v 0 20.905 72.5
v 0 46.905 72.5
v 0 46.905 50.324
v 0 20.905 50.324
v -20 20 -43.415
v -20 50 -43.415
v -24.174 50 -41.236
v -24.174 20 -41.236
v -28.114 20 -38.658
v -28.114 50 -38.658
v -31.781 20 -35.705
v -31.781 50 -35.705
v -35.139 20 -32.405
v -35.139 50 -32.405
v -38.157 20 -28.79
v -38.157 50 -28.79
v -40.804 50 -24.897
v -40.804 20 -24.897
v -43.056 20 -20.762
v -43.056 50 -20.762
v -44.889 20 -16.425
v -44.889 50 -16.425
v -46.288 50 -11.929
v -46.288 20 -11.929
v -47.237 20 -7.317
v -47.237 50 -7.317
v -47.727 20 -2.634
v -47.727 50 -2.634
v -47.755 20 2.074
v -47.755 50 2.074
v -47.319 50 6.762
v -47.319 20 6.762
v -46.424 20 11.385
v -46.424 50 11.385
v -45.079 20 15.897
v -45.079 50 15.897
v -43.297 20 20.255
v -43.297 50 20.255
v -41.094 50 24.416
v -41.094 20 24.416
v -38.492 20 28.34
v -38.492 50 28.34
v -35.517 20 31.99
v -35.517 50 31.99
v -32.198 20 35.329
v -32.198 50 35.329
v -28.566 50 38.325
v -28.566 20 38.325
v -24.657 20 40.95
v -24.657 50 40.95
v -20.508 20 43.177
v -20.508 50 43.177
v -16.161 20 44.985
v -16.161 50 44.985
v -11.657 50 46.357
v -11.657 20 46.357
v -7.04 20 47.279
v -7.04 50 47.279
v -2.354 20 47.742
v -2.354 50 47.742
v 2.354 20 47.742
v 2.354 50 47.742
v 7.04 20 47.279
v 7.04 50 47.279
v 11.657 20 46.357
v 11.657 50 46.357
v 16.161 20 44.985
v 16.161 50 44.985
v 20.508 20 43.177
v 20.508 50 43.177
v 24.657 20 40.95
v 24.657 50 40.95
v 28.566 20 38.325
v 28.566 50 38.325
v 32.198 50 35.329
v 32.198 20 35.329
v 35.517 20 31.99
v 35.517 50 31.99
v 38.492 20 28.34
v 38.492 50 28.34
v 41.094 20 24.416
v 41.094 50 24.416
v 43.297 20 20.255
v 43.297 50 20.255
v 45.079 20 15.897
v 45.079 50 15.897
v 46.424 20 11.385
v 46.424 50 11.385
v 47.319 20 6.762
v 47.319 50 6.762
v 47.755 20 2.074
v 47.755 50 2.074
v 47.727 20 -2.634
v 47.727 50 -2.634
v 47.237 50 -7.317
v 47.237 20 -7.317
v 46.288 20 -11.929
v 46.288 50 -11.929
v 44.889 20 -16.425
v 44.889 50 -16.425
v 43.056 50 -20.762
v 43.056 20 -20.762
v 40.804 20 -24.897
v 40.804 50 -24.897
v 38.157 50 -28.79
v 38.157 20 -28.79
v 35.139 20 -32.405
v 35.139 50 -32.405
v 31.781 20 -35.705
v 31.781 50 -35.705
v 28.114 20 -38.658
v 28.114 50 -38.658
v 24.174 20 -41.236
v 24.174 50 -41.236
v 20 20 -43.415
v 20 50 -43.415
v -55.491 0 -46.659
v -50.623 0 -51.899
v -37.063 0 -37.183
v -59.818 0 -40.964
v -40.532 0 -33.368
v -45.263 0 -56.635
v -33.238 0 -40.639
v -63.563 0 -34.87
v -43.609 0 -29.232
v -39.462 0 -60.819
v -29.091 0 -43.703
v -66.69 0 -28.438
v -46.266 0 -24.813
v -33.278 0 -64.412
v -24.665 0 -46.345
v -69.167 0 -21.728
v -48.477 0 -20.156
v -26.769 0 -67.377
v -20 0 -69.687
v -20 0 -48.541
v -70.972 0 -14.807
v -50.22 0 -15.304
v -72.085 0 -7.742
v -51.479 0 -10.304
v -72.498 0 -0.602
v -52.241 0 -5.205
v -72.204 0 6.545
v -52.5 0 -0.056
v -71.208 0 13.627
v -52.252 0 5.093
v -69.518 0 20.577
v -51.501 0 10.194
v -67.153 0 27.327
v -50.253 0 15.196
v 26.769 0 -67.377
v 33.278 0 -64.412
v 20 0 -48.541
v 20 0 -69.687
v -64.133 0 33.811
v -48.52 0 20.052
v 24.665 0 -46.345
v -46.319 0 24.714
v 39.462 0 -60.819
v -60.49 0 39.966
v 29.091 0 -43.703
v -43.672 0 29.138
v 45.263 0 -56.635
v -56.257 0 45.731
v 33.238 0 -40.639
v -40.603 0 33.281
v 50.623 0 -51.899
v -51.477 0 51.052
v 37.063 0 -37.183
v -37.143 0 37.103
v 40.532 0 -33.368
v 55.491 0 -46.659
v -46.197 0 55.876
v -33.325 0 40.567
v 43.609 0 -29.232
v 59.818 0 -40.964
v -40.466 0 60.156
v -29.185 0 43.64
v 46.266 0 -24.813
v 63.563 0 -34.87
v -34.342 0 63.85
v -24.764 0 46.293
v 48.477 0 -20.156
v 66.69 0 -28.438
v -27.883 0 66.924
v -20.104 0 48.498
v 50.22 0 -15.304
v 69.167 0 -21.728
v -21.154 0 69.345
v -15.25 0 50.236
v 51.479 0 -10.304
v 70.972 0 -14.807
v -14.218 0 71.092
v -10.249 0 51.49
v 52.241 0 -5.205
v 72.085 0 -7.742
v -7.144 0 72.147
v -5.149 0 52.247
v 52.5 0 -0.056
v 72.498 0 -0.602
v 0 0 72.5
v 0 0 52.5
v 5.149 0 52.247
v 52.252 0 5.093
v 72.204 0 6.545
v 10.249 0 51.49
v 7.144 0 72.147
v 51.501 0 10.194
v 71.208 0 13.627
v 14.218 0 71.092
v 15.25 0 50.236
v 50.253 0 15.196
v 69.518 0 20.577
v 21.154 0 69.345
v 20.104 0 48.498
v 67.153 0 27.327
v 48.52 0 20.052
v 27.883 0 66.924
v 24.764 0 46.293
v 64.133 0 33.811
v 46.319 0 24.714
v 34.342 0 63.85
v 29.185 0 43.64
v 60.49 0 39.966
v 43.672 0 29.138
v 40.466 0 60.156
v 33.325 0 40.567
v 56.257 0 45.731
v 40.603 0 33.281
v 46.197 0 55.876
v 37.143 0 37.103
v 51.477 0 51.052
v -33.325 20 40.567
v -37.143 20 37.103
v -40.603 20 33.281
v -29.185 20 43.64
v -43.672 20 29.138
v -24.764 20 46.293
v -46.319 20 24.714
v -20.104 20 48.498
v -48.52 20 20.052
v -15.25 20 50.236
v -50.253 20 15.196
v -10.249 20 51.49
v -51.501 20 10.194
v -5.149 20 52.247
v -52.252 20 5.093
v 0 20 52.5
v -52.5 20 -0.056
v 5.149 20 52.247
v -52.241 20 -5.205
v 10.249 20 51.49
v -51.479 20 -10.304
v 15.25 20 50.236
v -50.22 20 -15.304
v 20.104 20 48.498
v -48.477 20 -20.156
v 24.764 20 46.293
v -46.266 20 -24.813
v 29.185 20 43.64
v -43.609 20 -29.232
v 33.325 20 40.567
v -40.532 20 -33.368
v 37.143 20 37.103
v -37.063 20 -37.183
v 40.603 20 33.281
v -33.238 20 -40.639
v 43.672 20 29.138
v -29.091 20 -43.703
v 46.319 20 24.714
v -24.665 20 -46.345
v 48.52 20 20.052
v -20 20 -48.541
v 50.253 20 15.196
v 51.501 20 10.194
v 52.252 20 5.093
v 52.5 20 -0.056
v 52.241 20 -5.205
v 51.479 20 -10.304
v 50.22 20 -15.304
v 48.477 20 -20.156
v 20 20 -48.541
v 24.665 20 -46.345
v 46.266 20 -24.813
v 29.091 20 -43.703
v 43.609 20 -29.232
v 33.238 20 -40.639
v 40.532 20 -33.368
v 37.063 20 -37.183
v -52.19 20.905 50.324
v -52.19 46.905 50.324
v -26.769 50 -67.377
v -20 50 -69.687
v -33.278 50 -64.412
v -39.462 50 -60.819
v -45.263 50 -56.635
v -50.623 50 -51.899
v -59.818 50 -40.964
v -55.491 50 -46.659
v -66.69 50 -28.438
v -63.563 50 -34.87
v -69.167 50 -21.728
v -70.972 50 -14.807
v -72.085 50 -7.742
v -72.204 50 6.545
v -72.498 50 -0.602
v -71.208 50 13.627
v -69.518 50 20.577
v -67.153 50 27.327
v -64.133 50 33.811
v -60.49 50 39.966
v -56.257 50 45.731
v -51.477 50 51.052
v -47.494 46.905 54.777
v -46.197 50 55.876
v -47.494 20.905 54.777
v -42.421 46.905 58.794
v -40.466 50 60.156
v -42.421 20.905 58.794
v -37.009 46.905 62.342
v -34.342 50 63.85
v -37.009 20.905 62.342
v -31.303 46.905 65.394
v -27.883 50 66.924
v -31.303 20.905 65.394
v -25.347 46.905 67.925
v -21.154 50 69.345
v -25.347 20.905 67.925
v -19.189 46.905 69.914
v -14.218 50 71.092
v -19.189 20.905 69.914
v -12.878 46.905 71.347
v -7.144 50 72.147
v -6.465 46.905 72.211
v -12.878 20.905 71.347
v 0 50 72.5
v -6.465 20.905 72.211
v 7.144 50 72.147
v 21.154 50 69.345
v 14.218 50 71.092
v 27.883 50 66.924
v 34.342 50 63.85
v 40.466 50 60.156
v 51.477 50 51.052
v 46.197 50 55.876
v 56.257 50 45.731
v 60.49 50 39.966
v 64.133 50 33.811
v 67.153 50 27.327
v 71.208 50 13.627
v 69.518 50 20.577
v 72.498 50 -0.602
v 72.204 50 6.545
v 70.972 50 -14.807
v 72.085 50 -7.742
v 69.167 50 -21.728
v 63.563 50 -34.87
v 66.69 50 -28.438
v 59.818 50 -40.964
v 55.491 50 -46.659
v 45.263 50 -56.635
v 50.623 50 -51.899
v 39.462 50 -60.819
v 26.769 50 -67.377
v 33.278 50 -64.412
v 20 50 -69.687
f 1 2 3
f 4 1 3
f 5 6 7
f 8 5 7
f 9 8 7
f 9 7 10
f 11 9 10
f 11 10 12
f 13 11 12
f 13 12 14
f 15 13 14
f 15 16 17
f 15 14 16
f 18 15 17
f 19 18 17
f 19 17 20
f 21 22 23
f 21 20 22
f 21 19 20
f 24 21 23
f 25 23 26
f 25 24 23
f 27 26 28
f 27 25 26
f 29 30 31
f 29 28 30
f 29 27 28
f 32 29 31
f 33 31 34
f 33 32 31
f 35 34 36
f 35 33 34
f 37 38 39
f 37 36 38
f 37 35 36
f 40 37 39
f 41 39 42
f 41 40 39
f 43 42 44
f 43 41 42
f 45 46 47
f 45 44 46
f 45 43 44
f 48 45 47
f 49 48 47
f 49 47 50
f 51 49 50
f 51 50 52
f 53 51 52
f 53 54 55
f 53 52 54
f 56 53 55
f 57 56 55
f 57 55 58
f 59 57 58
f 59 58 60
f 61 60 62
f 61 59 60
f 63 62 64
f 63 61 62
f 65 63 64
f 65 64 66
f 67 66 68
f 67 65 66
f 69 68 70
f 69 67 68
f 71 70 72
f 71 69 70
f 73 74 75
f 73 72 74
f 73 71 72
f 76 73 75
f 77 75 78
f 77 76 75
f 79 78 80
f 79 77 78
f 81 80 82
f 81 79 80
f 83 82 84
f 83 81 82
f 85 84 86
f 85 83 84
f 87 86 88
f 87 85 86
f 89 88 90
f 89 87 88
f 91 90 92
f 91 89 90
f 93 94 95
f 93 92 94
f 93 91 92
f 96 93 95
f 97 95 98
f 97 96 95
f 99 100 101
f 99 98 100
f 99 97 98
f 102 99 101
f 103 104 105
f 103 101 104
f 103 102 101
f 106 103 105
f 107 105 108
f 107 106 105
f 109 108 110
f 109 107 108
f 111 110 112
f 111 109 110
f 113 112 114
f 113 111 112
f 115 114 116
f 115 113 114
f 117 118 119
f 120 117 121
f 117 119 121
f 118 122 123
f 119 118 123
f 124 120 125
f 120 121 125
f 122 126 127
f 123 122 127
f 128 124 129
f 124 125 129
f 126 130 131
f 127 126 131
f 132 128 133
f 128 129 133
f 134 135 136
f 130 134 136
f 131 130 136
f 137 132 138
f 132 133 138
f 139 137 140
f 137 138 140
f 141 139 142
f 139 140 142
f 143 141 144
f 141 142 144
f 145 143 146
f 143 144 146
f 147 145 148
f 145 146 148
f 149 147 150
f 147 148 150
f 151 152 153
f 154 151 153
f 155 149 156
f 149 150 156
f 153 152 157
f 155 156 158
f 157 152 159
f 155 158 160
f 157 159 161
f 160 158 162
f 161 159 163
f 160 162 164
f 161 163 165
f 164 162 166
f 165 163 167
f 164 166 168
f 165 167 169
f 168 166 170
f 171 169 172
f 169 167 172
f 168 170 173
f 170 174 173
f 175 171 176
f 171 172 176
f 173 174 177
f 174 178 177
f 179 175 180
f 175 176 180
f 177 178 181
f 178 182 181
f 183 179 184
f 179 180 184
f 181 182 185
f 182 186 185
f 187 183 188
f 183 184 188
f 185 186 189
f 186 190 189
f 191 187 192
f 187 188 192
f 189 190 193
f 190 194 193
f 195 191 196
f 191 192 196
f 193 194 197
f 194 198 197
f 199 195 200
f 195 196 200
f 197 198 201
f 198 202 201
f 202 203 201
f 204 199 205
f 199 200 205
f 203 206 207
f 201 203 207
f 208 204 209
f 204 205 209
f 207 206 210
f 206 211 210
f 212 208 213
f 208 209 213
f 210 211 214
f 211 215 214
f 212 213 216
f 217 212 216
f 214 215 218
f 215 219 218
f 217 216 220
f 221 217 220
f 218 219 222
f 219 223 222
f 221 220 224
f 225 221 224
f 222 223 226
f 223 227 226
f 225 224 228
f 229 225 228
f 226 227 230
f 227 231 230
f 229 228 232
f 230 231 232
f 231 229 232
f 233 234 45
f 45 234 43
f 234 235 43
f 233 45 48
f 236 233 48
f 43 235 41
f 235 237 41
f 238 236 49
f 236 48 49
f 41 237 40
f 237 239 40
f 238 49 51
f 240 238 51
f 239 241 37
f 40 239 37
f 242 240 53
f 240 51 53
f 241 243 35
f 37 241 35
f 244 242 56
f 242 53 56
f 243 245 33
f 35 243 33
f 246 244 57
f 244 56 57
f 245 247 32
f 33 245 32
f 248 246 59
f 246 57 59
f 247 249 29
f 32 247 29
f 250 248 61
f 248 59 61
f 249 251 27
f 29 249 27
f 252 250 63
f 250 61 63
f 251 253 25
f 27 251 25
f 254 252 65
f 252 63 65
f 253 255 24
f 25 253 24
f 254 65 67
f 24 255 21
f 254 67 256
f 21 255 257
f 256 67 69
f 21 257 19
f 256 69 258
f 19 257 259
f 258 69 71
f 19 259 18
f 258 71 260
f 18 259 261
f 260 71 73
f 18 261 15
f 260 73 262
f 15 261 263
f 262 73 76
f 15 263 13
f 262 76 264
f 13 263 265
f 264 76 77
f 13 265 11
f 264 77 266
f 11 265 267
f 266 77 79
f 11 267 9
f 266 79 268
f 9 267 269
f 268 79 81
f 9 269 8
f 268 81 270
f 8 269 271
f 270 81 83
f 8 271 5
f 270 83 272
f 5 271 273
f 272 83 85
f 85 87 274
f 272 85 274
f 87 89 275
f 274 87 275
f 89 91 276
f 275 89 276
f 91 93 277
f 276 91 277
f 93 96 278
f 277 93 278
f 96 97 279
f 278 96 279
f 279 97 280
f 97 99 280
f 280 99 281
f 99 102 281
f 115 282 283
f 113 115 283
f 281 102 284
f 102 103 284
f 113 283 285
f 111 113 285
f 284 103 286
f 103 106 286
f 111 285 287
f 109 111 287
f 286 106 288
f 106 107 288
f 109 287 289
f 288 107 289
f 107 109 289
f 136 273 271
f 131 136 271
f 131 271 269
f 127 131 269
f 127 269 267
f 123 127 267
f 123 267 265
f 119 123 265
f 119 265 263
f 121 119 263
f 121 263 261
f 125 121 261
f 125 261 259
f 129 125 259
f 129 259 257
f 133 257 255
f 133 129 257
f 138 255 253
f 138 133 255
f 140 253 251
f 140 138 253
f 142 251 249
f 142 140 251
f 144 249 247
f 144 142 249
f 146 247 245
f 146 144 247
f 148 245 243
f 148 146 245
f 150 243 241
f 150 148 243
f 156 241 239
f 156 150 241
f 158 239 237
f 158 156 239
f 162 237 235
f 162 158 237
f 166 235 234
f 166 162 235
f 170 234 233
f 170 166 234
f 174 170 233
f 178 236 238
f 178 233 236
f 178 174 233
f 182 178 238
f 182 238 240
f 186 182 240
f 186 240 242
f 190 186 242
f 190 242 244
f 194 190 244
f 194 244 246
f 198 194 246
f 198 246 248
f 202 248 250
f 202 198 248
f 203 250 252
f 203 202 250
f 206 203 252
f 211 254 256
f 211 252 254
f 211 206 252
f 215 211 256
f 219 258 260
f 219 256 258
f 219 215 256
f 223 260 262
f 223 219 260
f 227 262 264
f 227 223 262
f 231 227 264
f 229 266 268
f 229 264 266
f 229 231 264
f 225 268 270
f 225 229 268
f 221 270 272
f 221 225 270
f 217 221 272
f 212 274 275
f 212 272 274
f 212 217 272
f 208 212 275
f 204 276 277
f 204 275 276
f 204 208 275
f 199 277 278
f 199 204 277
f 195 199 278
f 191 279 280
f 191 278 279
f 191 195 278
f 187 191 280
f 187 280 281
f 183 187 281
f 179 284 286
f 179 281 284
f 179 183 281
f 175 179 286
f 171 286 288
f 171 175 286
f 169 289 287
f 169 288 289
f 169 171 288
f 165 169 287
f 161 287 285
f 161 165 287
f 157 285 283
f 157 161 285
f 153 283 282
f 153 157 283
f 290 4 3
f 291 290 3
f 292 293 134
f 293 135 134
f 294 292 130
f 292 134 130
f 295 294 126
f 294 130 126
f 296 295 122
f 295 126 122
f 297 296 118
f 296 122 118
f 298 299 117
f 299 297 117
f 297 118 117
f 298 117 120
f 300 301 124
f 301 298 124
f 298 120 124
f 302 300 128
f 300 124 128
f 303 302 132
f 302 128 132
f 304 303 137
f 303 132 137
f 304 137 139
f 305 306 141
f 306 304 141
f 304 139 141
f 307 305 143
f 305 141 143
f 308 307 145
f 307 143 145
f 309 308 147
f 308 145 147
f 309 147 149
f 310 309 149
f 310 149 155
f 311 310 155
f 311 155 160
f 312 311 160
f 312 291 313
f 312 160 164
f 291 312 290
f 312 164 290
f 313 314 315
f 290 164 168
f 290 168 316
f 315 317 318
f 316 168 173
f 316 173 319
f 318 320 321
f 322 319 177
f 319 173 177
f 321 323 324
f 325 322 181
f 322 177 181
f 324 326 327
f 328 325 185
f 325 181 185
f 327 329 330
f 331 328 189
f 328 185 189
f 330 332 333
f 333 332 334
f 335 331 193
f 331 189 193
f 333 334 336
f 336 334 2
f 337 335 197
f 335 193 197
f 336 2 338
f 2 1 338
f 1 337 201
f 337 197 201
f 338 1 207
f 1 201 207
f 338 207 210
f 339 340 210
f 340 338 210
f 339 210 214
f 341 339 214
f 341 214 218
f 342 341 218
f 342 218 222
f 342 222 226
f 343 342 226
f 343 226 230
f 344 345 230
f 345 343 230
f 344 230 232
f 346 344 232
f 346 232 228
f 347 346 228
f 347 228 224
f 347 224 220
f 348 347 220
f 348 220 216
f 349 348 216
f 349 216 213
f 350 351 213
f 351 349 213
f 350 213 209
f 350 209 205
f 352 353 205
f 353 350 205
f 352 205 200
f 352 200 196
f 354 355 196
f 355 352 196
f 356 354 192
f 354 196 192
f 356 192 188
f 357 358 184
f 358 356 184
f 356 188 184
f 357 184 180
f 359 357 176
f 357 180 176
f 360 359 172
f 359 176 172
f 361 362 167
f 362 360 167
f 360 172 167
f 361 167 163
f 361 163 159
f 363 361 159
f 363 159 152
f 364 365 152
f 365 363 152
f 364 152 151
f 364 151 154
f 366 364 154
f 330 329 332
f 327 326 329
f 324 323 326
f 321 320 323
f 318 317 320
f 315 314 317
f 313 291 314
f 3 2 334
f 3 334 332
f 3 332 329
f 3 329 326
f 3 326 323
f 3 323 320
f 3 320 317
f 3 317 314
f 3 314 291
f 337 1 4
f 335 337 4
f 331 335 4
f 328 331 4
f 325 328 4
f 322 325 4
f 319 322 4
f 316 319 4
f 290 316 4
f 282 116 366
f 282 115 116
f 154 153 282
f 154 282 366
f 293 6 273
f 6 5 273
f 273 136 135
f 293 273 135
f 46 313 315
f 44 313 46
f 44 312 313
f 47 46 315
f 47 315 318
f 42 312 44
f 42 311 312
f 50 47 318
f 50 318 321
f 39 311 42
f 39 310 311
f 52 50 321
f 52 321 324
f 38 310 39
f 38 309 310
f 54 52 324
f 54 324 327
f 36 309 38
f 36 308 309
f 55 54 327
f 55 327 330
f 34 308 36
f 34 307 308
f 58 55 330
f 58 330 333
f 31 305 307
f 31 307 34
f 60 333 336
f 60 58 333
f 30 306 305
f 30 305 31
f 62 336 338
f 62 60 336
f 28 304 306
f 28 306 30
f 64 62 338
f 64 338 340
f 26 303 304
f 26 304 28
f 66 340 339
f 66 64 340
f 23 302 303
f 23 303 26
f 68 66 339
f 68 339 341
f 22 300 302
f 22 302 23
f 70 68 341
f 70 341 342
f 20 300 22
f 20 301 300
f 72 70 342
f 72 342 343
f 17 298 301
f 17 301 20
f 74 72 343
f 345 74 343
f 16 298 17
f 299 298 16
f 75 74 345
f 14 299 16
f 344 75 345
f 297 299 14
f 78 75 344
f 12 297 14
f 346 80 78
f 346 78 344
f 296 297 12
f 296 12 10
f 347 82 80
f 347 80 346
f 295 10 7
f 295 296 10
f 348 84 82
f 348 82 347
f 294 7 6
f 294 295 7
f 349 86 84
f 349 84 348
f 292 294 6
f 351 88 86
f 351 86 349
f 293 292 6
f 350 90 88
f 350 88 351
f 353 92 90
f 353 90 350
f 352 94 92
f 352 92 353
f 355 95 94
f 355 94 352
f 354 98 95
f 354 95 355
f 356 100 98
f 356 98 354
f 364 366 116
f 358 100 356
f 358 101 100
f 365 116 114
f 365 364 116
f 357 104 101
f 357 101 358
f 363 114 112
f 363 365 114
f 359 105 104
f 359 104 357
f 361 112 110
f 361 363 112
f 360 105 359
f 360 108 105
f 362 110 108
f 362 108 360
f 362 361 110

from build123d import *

# Parameters (mm, degrees)
ESBO_O1_R                  = 72.5
ESBO_O1_R_2                = 52.5
RESSALTO_EXTRUS_O1_DEPTH   = 50
CORTE_EXTRUS_O1_DEPTH      = 115.072345465
CORTE_EXTRUS_O1_DEPTH_BACK = 115.072345465
ESBO_O2_W                  = 40
ESBO_O2_H                  = 97.356983932
RESSALTO_EXTRUS_O2_START   = -30
ESBO_O3_R                  = 52.5
ESBO_O3_R_2                = 47.8
RESSALTO_EXTRUS_O2_DEPTH   = 30
CORTE_EXTRUS_O2_DEPTH      = 115.072345465
CORTE_EXTRUS_O2_DEPTH_BACK = 115.072345465
ESBO_O5_W                  = 23.143765799
ESBO_O5_H                  = 26
CORTE_EXTRUS_O3_DEPTH      = 115.072345465


with BuildPart() as part:
    # Esboço1 → Ressalto-extrusão1 (new body)
    with BuildSketch(Plane(origin=(0, 0, 0), x_dir=(1, 0, 0), z_dir=(0, 1, 0))):
        with Locations(Location((0, 0, 0), (0, 0, 270))):
            Circle(ESBO_O1_R)
        with Locations(Location((0, 0, 0), (0, 0, 270))):
            Circle(ESBO_O1_R_2, mode=Mode.SUBTRACT)
    extrude(amount=RESSALTO_EXTRUS_O1_DEPTH)

    # Esboço2 → Corte-extrusão1 (cut, two sides: drawn at the far end of the back side and taken through both)
    with BuildSketch(Plane(origin=(0, 50, 0), x_dir=(1, 0, 0), z_dir=(0, 1, 0)).offset(-CORTE_EXTRUS_O1_DEPTH_BACK)):
        with Locations((0, 48.678491966)):
            Rectangle(ESBO_O2_W, ESBO_O2_H)
    extrude(amount=CORTE_EXTRUS_O1_DEPTH + CORTE_EXTRUS_O1_DEPTH_BACK, mode=Mode.SUBTRACT)

    # Esboço3 → Ressalto-extrusão2 (add)
    with BuildSketch(Plane(origin=(0, 50, 0), x_dir=(1, 0, 0), z_dir=(0, 1, 0)).offset(RESSALTO_EXTRUS_O2_START)):
        Circle(ESBO_O3_R)
        with Locations(Location((0, 0, 0), (0, 0, 270))):
            Circle(ESBO_O3_R_2, mode=Mode.SUBTRACT)
    extrude(amount=RESSALTO_EXTRUS_O2_DEPTH)

    # Esboço4 → Corte-extrusão2 (cut, two sides: drawn at the far end of the back side and taken through both)
    with BuildSketch(Plane(origin=(0, 50, 0), x_dir=(1, 0, 0), z_dir=(0, 1, 0)).offset(-CORTE_EXTRUS_O2_DEPTH_BACK)):
        Polygon((-20, 69.686799324), (-20, 29.755386526), (20, 29.755386526), (20, 73.66525197), (-20, 73.66525197), align=None)
    extrude(amount=CORTE_EXTRUS_O2_DEPTH + CORTE_EXTRUS_O2_DEPTH_BACK, mode=Mode.SUBTRACT)

    # Esboço5 → Corte-extrusão3 (cut, through all)
    with BuildSketch(Plane(origin=(0, 0, 0), x_dir=(0, 0, -1), z_dir=(1, 0, 0))):
        with Locations((-61.895664133, 33.904990218)):
            Rectangle(ESBO_O5_W, ESBO_O5_H)
    extrude(amount=-CORTE_EXTRUS_O3_DEPTH, mode=Mode.SUBTRACT)


solid = part.part
